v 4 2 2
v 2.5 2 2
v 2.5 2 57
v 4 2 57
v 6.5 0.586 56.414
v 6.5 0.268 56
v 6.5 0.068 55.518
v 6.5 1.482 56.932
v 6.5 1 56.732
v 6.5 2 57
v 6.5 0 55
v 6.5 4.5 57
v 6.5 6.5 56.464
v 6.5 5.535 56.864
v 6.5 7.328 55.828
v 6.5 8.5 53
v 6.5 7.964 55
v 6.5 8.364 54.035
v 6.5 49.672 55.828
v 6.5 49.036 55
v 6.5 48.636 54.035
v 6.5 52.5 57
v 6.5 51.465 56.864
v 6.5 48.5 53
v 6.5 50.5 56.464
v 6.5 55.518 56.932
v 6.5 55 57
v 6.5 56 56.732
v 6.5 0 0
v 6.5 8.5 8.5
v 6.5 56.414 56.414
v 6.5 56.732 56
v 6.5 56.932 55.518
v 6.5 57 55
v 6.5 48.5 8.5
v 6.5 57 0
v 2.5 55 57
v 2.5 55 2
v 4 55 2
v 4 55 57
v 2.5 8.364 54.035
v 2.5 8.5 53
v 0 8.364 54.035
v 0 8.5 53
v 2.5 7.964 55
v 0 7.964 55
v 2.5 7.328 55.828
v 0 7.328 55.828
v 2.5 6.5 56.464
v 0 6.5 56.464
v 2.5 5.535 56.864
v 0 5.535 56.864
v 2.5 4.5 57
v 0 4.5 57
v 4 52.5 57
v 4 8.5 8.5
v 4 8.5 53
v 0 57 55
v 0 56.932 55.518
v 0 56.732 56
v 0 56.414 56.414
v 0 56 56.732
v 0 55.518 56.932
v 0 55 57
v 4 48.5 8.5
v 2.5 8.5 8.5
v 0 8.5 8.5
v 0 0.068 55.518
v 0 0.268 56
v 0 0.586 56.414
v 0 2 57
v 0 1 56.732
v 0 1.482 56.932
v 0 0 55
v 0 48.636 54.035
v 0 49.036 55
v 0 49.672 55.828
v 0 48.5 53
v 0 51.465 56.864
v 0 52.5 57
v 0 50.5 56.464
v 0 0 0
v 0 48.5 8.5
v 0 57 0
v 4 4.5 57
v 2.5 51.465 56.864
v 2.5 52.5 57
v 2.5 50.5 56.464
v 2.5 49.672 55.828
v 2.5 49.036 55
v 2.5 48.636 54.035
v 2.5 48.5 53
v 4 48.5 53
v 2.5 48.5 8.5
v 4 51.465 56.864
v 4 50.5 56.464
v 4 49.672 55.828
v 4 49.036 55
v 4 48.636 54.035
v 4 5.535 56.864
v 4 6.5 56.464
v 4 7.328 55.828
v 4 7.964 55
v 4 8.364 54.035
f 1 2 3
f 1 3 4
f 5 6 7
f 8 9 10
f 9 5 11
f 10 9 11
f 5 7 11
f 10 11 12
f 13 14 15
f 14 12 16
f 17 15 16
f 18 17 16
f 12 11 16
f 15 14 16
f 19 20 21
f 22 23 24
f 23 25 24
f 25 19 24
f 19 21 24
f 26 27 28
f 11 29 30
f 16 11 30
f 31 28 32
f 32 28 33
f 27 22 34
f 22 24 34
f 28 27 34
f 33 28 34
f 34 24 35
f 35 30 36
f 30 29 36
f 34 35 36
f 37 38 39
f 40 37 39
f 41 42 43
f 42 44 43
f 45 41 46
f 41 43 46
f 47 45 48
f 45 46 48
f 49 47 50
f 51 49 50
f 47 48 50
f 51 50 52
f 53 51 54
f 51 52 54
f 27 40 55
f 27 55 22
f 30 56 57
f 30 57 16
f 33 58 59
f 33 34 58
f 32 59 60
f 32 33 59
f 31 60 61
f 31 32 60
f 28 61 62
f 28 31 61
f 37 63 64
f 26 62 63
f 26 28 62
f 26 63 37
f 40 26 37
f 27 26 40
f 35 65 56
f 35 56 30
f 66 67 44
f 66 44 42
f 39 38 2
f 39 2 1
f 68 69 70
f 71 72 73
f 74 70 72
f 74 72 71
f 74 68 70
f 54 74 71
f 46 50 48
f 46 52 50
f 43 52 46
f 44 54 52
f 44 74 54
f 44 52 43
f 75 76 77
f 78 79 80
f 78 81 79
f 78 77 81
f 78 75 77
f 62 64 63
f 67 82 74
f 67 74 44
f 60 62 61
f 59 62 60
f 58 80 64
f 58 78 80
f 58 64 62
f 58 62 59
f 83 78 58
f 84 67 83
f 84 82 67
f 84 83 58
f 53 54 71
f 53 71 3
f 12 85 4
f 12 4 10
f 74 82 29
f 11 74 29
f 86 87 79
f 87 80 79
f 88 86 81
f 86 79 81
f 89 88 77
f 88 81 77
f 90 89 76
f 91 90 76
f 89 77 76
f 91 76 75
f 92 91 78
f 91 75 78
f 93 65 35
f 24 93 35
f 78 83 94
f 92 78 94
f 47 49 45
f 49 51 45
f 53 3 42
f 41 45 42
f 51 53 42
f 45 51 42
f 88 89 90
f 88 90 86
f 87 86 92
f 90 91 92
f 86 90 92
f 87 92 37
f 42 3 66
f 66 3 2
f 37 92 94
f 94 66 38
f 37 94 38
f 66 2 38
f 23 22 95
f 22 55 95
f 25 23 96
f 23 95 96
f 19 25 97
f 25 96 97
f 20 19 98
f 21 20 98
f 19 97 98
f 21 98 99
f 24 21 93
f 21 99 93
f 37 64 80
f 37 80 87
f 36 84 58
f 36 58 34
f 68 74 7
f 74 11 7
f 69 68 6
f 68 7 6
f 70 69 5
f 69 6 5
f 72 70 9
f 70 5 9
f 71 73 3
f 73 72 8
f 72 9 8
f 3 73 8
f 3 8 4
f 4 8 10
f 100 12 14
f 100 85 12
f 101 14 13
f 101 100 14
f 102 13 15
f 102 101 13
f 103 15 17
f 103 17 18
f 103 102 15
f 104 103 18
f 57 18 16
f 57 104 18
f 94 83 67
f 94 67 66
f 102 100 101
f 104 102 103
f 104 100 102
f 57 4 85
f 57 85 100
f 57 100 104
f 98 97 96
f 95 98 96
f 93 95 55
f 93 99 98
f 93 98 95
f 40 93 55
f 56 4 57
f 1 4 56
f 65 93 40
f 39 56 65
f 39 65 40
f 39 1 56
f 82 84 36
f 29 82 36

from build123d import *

# Parameters (mm, degrees)
BOX004_W     = 10
BOX004_H     = 40
BOX004_DEPTH = 100
BOX003_W     = 1.5
BOX003_H     = 53
BOX003_DEPTH = 80
BOX002_W     = 6.5
BOX002_H     = 57
BOX002_DEPTH = 57
FILLET002_R  = 2
FILLET003_R  = 4


with BuildPart() as slide_holder_central_hole:
    # Box004 → Box004 (new body)
    with BuildSketch(Plane(origin=(-2, 8.5, 8.5), x_dir=(1, 0, 0), z_dir=(0, 0, 1))):
        with Locations((5, 20)):
            Rectangle(BOX004_W, BOX004_H)
    extrude(amount=BOX004_DEPTH)


with BuildPart() as slide_holder_hole_fusion:
    # Box003 → Box003 (new body)
    with BuildSketch(Plane(origin=(2.5, 2, 2), x_dir=(1, 0, 0), z_dir=(0, 0, 1))):
        with Locations((0.75, 26.5)):
            Rectangle(BOX003_W, BOX003_H)
    extrude(amount=BOX003_DEPTH)

    # Fusion001: union slide holder central hole
    add(slide_holder_central_hole.part)


with BuildPart() as slider_holder_cut_fillet:
    # Box002 → Box002 (new body)
    with BuildSketch(Plane.XY):
        with Locations((3.25, 28.5)):
            Rectangle(BOX002_W, BOX002_H)
    extrude(amount=BOX002_DEPTH)

    # Fillet002
    fillet002_edges = [slider_holder_cut_fillet.edges().sort_by_distance(p)[0] for p in [
        (3.25, 0, 57),
        (3.25, 57, 57),
    ]]
    fillet(fillet002_edges, radius=FILLET002_R)

    # Cut002: cut slide holder hole fusion
    add(slide_holder_hole_fusion.part, mode=Mode.SUBTRACT)

    # Fillet003
    fillet003_edges = [slider_holder_cut_fillet.edges().sort_by_distance(p)[0] for p in [
        (1.25, 8.5, 57),
        (1.25, 48.5, 57),
        (5.25, 8.5, 57),
        (5.25, 48.5, 57),
    ]]
    fillet(fillet003_edges, radius=FILLET003_R)


solid = slider_holder_cut_fillet.part
